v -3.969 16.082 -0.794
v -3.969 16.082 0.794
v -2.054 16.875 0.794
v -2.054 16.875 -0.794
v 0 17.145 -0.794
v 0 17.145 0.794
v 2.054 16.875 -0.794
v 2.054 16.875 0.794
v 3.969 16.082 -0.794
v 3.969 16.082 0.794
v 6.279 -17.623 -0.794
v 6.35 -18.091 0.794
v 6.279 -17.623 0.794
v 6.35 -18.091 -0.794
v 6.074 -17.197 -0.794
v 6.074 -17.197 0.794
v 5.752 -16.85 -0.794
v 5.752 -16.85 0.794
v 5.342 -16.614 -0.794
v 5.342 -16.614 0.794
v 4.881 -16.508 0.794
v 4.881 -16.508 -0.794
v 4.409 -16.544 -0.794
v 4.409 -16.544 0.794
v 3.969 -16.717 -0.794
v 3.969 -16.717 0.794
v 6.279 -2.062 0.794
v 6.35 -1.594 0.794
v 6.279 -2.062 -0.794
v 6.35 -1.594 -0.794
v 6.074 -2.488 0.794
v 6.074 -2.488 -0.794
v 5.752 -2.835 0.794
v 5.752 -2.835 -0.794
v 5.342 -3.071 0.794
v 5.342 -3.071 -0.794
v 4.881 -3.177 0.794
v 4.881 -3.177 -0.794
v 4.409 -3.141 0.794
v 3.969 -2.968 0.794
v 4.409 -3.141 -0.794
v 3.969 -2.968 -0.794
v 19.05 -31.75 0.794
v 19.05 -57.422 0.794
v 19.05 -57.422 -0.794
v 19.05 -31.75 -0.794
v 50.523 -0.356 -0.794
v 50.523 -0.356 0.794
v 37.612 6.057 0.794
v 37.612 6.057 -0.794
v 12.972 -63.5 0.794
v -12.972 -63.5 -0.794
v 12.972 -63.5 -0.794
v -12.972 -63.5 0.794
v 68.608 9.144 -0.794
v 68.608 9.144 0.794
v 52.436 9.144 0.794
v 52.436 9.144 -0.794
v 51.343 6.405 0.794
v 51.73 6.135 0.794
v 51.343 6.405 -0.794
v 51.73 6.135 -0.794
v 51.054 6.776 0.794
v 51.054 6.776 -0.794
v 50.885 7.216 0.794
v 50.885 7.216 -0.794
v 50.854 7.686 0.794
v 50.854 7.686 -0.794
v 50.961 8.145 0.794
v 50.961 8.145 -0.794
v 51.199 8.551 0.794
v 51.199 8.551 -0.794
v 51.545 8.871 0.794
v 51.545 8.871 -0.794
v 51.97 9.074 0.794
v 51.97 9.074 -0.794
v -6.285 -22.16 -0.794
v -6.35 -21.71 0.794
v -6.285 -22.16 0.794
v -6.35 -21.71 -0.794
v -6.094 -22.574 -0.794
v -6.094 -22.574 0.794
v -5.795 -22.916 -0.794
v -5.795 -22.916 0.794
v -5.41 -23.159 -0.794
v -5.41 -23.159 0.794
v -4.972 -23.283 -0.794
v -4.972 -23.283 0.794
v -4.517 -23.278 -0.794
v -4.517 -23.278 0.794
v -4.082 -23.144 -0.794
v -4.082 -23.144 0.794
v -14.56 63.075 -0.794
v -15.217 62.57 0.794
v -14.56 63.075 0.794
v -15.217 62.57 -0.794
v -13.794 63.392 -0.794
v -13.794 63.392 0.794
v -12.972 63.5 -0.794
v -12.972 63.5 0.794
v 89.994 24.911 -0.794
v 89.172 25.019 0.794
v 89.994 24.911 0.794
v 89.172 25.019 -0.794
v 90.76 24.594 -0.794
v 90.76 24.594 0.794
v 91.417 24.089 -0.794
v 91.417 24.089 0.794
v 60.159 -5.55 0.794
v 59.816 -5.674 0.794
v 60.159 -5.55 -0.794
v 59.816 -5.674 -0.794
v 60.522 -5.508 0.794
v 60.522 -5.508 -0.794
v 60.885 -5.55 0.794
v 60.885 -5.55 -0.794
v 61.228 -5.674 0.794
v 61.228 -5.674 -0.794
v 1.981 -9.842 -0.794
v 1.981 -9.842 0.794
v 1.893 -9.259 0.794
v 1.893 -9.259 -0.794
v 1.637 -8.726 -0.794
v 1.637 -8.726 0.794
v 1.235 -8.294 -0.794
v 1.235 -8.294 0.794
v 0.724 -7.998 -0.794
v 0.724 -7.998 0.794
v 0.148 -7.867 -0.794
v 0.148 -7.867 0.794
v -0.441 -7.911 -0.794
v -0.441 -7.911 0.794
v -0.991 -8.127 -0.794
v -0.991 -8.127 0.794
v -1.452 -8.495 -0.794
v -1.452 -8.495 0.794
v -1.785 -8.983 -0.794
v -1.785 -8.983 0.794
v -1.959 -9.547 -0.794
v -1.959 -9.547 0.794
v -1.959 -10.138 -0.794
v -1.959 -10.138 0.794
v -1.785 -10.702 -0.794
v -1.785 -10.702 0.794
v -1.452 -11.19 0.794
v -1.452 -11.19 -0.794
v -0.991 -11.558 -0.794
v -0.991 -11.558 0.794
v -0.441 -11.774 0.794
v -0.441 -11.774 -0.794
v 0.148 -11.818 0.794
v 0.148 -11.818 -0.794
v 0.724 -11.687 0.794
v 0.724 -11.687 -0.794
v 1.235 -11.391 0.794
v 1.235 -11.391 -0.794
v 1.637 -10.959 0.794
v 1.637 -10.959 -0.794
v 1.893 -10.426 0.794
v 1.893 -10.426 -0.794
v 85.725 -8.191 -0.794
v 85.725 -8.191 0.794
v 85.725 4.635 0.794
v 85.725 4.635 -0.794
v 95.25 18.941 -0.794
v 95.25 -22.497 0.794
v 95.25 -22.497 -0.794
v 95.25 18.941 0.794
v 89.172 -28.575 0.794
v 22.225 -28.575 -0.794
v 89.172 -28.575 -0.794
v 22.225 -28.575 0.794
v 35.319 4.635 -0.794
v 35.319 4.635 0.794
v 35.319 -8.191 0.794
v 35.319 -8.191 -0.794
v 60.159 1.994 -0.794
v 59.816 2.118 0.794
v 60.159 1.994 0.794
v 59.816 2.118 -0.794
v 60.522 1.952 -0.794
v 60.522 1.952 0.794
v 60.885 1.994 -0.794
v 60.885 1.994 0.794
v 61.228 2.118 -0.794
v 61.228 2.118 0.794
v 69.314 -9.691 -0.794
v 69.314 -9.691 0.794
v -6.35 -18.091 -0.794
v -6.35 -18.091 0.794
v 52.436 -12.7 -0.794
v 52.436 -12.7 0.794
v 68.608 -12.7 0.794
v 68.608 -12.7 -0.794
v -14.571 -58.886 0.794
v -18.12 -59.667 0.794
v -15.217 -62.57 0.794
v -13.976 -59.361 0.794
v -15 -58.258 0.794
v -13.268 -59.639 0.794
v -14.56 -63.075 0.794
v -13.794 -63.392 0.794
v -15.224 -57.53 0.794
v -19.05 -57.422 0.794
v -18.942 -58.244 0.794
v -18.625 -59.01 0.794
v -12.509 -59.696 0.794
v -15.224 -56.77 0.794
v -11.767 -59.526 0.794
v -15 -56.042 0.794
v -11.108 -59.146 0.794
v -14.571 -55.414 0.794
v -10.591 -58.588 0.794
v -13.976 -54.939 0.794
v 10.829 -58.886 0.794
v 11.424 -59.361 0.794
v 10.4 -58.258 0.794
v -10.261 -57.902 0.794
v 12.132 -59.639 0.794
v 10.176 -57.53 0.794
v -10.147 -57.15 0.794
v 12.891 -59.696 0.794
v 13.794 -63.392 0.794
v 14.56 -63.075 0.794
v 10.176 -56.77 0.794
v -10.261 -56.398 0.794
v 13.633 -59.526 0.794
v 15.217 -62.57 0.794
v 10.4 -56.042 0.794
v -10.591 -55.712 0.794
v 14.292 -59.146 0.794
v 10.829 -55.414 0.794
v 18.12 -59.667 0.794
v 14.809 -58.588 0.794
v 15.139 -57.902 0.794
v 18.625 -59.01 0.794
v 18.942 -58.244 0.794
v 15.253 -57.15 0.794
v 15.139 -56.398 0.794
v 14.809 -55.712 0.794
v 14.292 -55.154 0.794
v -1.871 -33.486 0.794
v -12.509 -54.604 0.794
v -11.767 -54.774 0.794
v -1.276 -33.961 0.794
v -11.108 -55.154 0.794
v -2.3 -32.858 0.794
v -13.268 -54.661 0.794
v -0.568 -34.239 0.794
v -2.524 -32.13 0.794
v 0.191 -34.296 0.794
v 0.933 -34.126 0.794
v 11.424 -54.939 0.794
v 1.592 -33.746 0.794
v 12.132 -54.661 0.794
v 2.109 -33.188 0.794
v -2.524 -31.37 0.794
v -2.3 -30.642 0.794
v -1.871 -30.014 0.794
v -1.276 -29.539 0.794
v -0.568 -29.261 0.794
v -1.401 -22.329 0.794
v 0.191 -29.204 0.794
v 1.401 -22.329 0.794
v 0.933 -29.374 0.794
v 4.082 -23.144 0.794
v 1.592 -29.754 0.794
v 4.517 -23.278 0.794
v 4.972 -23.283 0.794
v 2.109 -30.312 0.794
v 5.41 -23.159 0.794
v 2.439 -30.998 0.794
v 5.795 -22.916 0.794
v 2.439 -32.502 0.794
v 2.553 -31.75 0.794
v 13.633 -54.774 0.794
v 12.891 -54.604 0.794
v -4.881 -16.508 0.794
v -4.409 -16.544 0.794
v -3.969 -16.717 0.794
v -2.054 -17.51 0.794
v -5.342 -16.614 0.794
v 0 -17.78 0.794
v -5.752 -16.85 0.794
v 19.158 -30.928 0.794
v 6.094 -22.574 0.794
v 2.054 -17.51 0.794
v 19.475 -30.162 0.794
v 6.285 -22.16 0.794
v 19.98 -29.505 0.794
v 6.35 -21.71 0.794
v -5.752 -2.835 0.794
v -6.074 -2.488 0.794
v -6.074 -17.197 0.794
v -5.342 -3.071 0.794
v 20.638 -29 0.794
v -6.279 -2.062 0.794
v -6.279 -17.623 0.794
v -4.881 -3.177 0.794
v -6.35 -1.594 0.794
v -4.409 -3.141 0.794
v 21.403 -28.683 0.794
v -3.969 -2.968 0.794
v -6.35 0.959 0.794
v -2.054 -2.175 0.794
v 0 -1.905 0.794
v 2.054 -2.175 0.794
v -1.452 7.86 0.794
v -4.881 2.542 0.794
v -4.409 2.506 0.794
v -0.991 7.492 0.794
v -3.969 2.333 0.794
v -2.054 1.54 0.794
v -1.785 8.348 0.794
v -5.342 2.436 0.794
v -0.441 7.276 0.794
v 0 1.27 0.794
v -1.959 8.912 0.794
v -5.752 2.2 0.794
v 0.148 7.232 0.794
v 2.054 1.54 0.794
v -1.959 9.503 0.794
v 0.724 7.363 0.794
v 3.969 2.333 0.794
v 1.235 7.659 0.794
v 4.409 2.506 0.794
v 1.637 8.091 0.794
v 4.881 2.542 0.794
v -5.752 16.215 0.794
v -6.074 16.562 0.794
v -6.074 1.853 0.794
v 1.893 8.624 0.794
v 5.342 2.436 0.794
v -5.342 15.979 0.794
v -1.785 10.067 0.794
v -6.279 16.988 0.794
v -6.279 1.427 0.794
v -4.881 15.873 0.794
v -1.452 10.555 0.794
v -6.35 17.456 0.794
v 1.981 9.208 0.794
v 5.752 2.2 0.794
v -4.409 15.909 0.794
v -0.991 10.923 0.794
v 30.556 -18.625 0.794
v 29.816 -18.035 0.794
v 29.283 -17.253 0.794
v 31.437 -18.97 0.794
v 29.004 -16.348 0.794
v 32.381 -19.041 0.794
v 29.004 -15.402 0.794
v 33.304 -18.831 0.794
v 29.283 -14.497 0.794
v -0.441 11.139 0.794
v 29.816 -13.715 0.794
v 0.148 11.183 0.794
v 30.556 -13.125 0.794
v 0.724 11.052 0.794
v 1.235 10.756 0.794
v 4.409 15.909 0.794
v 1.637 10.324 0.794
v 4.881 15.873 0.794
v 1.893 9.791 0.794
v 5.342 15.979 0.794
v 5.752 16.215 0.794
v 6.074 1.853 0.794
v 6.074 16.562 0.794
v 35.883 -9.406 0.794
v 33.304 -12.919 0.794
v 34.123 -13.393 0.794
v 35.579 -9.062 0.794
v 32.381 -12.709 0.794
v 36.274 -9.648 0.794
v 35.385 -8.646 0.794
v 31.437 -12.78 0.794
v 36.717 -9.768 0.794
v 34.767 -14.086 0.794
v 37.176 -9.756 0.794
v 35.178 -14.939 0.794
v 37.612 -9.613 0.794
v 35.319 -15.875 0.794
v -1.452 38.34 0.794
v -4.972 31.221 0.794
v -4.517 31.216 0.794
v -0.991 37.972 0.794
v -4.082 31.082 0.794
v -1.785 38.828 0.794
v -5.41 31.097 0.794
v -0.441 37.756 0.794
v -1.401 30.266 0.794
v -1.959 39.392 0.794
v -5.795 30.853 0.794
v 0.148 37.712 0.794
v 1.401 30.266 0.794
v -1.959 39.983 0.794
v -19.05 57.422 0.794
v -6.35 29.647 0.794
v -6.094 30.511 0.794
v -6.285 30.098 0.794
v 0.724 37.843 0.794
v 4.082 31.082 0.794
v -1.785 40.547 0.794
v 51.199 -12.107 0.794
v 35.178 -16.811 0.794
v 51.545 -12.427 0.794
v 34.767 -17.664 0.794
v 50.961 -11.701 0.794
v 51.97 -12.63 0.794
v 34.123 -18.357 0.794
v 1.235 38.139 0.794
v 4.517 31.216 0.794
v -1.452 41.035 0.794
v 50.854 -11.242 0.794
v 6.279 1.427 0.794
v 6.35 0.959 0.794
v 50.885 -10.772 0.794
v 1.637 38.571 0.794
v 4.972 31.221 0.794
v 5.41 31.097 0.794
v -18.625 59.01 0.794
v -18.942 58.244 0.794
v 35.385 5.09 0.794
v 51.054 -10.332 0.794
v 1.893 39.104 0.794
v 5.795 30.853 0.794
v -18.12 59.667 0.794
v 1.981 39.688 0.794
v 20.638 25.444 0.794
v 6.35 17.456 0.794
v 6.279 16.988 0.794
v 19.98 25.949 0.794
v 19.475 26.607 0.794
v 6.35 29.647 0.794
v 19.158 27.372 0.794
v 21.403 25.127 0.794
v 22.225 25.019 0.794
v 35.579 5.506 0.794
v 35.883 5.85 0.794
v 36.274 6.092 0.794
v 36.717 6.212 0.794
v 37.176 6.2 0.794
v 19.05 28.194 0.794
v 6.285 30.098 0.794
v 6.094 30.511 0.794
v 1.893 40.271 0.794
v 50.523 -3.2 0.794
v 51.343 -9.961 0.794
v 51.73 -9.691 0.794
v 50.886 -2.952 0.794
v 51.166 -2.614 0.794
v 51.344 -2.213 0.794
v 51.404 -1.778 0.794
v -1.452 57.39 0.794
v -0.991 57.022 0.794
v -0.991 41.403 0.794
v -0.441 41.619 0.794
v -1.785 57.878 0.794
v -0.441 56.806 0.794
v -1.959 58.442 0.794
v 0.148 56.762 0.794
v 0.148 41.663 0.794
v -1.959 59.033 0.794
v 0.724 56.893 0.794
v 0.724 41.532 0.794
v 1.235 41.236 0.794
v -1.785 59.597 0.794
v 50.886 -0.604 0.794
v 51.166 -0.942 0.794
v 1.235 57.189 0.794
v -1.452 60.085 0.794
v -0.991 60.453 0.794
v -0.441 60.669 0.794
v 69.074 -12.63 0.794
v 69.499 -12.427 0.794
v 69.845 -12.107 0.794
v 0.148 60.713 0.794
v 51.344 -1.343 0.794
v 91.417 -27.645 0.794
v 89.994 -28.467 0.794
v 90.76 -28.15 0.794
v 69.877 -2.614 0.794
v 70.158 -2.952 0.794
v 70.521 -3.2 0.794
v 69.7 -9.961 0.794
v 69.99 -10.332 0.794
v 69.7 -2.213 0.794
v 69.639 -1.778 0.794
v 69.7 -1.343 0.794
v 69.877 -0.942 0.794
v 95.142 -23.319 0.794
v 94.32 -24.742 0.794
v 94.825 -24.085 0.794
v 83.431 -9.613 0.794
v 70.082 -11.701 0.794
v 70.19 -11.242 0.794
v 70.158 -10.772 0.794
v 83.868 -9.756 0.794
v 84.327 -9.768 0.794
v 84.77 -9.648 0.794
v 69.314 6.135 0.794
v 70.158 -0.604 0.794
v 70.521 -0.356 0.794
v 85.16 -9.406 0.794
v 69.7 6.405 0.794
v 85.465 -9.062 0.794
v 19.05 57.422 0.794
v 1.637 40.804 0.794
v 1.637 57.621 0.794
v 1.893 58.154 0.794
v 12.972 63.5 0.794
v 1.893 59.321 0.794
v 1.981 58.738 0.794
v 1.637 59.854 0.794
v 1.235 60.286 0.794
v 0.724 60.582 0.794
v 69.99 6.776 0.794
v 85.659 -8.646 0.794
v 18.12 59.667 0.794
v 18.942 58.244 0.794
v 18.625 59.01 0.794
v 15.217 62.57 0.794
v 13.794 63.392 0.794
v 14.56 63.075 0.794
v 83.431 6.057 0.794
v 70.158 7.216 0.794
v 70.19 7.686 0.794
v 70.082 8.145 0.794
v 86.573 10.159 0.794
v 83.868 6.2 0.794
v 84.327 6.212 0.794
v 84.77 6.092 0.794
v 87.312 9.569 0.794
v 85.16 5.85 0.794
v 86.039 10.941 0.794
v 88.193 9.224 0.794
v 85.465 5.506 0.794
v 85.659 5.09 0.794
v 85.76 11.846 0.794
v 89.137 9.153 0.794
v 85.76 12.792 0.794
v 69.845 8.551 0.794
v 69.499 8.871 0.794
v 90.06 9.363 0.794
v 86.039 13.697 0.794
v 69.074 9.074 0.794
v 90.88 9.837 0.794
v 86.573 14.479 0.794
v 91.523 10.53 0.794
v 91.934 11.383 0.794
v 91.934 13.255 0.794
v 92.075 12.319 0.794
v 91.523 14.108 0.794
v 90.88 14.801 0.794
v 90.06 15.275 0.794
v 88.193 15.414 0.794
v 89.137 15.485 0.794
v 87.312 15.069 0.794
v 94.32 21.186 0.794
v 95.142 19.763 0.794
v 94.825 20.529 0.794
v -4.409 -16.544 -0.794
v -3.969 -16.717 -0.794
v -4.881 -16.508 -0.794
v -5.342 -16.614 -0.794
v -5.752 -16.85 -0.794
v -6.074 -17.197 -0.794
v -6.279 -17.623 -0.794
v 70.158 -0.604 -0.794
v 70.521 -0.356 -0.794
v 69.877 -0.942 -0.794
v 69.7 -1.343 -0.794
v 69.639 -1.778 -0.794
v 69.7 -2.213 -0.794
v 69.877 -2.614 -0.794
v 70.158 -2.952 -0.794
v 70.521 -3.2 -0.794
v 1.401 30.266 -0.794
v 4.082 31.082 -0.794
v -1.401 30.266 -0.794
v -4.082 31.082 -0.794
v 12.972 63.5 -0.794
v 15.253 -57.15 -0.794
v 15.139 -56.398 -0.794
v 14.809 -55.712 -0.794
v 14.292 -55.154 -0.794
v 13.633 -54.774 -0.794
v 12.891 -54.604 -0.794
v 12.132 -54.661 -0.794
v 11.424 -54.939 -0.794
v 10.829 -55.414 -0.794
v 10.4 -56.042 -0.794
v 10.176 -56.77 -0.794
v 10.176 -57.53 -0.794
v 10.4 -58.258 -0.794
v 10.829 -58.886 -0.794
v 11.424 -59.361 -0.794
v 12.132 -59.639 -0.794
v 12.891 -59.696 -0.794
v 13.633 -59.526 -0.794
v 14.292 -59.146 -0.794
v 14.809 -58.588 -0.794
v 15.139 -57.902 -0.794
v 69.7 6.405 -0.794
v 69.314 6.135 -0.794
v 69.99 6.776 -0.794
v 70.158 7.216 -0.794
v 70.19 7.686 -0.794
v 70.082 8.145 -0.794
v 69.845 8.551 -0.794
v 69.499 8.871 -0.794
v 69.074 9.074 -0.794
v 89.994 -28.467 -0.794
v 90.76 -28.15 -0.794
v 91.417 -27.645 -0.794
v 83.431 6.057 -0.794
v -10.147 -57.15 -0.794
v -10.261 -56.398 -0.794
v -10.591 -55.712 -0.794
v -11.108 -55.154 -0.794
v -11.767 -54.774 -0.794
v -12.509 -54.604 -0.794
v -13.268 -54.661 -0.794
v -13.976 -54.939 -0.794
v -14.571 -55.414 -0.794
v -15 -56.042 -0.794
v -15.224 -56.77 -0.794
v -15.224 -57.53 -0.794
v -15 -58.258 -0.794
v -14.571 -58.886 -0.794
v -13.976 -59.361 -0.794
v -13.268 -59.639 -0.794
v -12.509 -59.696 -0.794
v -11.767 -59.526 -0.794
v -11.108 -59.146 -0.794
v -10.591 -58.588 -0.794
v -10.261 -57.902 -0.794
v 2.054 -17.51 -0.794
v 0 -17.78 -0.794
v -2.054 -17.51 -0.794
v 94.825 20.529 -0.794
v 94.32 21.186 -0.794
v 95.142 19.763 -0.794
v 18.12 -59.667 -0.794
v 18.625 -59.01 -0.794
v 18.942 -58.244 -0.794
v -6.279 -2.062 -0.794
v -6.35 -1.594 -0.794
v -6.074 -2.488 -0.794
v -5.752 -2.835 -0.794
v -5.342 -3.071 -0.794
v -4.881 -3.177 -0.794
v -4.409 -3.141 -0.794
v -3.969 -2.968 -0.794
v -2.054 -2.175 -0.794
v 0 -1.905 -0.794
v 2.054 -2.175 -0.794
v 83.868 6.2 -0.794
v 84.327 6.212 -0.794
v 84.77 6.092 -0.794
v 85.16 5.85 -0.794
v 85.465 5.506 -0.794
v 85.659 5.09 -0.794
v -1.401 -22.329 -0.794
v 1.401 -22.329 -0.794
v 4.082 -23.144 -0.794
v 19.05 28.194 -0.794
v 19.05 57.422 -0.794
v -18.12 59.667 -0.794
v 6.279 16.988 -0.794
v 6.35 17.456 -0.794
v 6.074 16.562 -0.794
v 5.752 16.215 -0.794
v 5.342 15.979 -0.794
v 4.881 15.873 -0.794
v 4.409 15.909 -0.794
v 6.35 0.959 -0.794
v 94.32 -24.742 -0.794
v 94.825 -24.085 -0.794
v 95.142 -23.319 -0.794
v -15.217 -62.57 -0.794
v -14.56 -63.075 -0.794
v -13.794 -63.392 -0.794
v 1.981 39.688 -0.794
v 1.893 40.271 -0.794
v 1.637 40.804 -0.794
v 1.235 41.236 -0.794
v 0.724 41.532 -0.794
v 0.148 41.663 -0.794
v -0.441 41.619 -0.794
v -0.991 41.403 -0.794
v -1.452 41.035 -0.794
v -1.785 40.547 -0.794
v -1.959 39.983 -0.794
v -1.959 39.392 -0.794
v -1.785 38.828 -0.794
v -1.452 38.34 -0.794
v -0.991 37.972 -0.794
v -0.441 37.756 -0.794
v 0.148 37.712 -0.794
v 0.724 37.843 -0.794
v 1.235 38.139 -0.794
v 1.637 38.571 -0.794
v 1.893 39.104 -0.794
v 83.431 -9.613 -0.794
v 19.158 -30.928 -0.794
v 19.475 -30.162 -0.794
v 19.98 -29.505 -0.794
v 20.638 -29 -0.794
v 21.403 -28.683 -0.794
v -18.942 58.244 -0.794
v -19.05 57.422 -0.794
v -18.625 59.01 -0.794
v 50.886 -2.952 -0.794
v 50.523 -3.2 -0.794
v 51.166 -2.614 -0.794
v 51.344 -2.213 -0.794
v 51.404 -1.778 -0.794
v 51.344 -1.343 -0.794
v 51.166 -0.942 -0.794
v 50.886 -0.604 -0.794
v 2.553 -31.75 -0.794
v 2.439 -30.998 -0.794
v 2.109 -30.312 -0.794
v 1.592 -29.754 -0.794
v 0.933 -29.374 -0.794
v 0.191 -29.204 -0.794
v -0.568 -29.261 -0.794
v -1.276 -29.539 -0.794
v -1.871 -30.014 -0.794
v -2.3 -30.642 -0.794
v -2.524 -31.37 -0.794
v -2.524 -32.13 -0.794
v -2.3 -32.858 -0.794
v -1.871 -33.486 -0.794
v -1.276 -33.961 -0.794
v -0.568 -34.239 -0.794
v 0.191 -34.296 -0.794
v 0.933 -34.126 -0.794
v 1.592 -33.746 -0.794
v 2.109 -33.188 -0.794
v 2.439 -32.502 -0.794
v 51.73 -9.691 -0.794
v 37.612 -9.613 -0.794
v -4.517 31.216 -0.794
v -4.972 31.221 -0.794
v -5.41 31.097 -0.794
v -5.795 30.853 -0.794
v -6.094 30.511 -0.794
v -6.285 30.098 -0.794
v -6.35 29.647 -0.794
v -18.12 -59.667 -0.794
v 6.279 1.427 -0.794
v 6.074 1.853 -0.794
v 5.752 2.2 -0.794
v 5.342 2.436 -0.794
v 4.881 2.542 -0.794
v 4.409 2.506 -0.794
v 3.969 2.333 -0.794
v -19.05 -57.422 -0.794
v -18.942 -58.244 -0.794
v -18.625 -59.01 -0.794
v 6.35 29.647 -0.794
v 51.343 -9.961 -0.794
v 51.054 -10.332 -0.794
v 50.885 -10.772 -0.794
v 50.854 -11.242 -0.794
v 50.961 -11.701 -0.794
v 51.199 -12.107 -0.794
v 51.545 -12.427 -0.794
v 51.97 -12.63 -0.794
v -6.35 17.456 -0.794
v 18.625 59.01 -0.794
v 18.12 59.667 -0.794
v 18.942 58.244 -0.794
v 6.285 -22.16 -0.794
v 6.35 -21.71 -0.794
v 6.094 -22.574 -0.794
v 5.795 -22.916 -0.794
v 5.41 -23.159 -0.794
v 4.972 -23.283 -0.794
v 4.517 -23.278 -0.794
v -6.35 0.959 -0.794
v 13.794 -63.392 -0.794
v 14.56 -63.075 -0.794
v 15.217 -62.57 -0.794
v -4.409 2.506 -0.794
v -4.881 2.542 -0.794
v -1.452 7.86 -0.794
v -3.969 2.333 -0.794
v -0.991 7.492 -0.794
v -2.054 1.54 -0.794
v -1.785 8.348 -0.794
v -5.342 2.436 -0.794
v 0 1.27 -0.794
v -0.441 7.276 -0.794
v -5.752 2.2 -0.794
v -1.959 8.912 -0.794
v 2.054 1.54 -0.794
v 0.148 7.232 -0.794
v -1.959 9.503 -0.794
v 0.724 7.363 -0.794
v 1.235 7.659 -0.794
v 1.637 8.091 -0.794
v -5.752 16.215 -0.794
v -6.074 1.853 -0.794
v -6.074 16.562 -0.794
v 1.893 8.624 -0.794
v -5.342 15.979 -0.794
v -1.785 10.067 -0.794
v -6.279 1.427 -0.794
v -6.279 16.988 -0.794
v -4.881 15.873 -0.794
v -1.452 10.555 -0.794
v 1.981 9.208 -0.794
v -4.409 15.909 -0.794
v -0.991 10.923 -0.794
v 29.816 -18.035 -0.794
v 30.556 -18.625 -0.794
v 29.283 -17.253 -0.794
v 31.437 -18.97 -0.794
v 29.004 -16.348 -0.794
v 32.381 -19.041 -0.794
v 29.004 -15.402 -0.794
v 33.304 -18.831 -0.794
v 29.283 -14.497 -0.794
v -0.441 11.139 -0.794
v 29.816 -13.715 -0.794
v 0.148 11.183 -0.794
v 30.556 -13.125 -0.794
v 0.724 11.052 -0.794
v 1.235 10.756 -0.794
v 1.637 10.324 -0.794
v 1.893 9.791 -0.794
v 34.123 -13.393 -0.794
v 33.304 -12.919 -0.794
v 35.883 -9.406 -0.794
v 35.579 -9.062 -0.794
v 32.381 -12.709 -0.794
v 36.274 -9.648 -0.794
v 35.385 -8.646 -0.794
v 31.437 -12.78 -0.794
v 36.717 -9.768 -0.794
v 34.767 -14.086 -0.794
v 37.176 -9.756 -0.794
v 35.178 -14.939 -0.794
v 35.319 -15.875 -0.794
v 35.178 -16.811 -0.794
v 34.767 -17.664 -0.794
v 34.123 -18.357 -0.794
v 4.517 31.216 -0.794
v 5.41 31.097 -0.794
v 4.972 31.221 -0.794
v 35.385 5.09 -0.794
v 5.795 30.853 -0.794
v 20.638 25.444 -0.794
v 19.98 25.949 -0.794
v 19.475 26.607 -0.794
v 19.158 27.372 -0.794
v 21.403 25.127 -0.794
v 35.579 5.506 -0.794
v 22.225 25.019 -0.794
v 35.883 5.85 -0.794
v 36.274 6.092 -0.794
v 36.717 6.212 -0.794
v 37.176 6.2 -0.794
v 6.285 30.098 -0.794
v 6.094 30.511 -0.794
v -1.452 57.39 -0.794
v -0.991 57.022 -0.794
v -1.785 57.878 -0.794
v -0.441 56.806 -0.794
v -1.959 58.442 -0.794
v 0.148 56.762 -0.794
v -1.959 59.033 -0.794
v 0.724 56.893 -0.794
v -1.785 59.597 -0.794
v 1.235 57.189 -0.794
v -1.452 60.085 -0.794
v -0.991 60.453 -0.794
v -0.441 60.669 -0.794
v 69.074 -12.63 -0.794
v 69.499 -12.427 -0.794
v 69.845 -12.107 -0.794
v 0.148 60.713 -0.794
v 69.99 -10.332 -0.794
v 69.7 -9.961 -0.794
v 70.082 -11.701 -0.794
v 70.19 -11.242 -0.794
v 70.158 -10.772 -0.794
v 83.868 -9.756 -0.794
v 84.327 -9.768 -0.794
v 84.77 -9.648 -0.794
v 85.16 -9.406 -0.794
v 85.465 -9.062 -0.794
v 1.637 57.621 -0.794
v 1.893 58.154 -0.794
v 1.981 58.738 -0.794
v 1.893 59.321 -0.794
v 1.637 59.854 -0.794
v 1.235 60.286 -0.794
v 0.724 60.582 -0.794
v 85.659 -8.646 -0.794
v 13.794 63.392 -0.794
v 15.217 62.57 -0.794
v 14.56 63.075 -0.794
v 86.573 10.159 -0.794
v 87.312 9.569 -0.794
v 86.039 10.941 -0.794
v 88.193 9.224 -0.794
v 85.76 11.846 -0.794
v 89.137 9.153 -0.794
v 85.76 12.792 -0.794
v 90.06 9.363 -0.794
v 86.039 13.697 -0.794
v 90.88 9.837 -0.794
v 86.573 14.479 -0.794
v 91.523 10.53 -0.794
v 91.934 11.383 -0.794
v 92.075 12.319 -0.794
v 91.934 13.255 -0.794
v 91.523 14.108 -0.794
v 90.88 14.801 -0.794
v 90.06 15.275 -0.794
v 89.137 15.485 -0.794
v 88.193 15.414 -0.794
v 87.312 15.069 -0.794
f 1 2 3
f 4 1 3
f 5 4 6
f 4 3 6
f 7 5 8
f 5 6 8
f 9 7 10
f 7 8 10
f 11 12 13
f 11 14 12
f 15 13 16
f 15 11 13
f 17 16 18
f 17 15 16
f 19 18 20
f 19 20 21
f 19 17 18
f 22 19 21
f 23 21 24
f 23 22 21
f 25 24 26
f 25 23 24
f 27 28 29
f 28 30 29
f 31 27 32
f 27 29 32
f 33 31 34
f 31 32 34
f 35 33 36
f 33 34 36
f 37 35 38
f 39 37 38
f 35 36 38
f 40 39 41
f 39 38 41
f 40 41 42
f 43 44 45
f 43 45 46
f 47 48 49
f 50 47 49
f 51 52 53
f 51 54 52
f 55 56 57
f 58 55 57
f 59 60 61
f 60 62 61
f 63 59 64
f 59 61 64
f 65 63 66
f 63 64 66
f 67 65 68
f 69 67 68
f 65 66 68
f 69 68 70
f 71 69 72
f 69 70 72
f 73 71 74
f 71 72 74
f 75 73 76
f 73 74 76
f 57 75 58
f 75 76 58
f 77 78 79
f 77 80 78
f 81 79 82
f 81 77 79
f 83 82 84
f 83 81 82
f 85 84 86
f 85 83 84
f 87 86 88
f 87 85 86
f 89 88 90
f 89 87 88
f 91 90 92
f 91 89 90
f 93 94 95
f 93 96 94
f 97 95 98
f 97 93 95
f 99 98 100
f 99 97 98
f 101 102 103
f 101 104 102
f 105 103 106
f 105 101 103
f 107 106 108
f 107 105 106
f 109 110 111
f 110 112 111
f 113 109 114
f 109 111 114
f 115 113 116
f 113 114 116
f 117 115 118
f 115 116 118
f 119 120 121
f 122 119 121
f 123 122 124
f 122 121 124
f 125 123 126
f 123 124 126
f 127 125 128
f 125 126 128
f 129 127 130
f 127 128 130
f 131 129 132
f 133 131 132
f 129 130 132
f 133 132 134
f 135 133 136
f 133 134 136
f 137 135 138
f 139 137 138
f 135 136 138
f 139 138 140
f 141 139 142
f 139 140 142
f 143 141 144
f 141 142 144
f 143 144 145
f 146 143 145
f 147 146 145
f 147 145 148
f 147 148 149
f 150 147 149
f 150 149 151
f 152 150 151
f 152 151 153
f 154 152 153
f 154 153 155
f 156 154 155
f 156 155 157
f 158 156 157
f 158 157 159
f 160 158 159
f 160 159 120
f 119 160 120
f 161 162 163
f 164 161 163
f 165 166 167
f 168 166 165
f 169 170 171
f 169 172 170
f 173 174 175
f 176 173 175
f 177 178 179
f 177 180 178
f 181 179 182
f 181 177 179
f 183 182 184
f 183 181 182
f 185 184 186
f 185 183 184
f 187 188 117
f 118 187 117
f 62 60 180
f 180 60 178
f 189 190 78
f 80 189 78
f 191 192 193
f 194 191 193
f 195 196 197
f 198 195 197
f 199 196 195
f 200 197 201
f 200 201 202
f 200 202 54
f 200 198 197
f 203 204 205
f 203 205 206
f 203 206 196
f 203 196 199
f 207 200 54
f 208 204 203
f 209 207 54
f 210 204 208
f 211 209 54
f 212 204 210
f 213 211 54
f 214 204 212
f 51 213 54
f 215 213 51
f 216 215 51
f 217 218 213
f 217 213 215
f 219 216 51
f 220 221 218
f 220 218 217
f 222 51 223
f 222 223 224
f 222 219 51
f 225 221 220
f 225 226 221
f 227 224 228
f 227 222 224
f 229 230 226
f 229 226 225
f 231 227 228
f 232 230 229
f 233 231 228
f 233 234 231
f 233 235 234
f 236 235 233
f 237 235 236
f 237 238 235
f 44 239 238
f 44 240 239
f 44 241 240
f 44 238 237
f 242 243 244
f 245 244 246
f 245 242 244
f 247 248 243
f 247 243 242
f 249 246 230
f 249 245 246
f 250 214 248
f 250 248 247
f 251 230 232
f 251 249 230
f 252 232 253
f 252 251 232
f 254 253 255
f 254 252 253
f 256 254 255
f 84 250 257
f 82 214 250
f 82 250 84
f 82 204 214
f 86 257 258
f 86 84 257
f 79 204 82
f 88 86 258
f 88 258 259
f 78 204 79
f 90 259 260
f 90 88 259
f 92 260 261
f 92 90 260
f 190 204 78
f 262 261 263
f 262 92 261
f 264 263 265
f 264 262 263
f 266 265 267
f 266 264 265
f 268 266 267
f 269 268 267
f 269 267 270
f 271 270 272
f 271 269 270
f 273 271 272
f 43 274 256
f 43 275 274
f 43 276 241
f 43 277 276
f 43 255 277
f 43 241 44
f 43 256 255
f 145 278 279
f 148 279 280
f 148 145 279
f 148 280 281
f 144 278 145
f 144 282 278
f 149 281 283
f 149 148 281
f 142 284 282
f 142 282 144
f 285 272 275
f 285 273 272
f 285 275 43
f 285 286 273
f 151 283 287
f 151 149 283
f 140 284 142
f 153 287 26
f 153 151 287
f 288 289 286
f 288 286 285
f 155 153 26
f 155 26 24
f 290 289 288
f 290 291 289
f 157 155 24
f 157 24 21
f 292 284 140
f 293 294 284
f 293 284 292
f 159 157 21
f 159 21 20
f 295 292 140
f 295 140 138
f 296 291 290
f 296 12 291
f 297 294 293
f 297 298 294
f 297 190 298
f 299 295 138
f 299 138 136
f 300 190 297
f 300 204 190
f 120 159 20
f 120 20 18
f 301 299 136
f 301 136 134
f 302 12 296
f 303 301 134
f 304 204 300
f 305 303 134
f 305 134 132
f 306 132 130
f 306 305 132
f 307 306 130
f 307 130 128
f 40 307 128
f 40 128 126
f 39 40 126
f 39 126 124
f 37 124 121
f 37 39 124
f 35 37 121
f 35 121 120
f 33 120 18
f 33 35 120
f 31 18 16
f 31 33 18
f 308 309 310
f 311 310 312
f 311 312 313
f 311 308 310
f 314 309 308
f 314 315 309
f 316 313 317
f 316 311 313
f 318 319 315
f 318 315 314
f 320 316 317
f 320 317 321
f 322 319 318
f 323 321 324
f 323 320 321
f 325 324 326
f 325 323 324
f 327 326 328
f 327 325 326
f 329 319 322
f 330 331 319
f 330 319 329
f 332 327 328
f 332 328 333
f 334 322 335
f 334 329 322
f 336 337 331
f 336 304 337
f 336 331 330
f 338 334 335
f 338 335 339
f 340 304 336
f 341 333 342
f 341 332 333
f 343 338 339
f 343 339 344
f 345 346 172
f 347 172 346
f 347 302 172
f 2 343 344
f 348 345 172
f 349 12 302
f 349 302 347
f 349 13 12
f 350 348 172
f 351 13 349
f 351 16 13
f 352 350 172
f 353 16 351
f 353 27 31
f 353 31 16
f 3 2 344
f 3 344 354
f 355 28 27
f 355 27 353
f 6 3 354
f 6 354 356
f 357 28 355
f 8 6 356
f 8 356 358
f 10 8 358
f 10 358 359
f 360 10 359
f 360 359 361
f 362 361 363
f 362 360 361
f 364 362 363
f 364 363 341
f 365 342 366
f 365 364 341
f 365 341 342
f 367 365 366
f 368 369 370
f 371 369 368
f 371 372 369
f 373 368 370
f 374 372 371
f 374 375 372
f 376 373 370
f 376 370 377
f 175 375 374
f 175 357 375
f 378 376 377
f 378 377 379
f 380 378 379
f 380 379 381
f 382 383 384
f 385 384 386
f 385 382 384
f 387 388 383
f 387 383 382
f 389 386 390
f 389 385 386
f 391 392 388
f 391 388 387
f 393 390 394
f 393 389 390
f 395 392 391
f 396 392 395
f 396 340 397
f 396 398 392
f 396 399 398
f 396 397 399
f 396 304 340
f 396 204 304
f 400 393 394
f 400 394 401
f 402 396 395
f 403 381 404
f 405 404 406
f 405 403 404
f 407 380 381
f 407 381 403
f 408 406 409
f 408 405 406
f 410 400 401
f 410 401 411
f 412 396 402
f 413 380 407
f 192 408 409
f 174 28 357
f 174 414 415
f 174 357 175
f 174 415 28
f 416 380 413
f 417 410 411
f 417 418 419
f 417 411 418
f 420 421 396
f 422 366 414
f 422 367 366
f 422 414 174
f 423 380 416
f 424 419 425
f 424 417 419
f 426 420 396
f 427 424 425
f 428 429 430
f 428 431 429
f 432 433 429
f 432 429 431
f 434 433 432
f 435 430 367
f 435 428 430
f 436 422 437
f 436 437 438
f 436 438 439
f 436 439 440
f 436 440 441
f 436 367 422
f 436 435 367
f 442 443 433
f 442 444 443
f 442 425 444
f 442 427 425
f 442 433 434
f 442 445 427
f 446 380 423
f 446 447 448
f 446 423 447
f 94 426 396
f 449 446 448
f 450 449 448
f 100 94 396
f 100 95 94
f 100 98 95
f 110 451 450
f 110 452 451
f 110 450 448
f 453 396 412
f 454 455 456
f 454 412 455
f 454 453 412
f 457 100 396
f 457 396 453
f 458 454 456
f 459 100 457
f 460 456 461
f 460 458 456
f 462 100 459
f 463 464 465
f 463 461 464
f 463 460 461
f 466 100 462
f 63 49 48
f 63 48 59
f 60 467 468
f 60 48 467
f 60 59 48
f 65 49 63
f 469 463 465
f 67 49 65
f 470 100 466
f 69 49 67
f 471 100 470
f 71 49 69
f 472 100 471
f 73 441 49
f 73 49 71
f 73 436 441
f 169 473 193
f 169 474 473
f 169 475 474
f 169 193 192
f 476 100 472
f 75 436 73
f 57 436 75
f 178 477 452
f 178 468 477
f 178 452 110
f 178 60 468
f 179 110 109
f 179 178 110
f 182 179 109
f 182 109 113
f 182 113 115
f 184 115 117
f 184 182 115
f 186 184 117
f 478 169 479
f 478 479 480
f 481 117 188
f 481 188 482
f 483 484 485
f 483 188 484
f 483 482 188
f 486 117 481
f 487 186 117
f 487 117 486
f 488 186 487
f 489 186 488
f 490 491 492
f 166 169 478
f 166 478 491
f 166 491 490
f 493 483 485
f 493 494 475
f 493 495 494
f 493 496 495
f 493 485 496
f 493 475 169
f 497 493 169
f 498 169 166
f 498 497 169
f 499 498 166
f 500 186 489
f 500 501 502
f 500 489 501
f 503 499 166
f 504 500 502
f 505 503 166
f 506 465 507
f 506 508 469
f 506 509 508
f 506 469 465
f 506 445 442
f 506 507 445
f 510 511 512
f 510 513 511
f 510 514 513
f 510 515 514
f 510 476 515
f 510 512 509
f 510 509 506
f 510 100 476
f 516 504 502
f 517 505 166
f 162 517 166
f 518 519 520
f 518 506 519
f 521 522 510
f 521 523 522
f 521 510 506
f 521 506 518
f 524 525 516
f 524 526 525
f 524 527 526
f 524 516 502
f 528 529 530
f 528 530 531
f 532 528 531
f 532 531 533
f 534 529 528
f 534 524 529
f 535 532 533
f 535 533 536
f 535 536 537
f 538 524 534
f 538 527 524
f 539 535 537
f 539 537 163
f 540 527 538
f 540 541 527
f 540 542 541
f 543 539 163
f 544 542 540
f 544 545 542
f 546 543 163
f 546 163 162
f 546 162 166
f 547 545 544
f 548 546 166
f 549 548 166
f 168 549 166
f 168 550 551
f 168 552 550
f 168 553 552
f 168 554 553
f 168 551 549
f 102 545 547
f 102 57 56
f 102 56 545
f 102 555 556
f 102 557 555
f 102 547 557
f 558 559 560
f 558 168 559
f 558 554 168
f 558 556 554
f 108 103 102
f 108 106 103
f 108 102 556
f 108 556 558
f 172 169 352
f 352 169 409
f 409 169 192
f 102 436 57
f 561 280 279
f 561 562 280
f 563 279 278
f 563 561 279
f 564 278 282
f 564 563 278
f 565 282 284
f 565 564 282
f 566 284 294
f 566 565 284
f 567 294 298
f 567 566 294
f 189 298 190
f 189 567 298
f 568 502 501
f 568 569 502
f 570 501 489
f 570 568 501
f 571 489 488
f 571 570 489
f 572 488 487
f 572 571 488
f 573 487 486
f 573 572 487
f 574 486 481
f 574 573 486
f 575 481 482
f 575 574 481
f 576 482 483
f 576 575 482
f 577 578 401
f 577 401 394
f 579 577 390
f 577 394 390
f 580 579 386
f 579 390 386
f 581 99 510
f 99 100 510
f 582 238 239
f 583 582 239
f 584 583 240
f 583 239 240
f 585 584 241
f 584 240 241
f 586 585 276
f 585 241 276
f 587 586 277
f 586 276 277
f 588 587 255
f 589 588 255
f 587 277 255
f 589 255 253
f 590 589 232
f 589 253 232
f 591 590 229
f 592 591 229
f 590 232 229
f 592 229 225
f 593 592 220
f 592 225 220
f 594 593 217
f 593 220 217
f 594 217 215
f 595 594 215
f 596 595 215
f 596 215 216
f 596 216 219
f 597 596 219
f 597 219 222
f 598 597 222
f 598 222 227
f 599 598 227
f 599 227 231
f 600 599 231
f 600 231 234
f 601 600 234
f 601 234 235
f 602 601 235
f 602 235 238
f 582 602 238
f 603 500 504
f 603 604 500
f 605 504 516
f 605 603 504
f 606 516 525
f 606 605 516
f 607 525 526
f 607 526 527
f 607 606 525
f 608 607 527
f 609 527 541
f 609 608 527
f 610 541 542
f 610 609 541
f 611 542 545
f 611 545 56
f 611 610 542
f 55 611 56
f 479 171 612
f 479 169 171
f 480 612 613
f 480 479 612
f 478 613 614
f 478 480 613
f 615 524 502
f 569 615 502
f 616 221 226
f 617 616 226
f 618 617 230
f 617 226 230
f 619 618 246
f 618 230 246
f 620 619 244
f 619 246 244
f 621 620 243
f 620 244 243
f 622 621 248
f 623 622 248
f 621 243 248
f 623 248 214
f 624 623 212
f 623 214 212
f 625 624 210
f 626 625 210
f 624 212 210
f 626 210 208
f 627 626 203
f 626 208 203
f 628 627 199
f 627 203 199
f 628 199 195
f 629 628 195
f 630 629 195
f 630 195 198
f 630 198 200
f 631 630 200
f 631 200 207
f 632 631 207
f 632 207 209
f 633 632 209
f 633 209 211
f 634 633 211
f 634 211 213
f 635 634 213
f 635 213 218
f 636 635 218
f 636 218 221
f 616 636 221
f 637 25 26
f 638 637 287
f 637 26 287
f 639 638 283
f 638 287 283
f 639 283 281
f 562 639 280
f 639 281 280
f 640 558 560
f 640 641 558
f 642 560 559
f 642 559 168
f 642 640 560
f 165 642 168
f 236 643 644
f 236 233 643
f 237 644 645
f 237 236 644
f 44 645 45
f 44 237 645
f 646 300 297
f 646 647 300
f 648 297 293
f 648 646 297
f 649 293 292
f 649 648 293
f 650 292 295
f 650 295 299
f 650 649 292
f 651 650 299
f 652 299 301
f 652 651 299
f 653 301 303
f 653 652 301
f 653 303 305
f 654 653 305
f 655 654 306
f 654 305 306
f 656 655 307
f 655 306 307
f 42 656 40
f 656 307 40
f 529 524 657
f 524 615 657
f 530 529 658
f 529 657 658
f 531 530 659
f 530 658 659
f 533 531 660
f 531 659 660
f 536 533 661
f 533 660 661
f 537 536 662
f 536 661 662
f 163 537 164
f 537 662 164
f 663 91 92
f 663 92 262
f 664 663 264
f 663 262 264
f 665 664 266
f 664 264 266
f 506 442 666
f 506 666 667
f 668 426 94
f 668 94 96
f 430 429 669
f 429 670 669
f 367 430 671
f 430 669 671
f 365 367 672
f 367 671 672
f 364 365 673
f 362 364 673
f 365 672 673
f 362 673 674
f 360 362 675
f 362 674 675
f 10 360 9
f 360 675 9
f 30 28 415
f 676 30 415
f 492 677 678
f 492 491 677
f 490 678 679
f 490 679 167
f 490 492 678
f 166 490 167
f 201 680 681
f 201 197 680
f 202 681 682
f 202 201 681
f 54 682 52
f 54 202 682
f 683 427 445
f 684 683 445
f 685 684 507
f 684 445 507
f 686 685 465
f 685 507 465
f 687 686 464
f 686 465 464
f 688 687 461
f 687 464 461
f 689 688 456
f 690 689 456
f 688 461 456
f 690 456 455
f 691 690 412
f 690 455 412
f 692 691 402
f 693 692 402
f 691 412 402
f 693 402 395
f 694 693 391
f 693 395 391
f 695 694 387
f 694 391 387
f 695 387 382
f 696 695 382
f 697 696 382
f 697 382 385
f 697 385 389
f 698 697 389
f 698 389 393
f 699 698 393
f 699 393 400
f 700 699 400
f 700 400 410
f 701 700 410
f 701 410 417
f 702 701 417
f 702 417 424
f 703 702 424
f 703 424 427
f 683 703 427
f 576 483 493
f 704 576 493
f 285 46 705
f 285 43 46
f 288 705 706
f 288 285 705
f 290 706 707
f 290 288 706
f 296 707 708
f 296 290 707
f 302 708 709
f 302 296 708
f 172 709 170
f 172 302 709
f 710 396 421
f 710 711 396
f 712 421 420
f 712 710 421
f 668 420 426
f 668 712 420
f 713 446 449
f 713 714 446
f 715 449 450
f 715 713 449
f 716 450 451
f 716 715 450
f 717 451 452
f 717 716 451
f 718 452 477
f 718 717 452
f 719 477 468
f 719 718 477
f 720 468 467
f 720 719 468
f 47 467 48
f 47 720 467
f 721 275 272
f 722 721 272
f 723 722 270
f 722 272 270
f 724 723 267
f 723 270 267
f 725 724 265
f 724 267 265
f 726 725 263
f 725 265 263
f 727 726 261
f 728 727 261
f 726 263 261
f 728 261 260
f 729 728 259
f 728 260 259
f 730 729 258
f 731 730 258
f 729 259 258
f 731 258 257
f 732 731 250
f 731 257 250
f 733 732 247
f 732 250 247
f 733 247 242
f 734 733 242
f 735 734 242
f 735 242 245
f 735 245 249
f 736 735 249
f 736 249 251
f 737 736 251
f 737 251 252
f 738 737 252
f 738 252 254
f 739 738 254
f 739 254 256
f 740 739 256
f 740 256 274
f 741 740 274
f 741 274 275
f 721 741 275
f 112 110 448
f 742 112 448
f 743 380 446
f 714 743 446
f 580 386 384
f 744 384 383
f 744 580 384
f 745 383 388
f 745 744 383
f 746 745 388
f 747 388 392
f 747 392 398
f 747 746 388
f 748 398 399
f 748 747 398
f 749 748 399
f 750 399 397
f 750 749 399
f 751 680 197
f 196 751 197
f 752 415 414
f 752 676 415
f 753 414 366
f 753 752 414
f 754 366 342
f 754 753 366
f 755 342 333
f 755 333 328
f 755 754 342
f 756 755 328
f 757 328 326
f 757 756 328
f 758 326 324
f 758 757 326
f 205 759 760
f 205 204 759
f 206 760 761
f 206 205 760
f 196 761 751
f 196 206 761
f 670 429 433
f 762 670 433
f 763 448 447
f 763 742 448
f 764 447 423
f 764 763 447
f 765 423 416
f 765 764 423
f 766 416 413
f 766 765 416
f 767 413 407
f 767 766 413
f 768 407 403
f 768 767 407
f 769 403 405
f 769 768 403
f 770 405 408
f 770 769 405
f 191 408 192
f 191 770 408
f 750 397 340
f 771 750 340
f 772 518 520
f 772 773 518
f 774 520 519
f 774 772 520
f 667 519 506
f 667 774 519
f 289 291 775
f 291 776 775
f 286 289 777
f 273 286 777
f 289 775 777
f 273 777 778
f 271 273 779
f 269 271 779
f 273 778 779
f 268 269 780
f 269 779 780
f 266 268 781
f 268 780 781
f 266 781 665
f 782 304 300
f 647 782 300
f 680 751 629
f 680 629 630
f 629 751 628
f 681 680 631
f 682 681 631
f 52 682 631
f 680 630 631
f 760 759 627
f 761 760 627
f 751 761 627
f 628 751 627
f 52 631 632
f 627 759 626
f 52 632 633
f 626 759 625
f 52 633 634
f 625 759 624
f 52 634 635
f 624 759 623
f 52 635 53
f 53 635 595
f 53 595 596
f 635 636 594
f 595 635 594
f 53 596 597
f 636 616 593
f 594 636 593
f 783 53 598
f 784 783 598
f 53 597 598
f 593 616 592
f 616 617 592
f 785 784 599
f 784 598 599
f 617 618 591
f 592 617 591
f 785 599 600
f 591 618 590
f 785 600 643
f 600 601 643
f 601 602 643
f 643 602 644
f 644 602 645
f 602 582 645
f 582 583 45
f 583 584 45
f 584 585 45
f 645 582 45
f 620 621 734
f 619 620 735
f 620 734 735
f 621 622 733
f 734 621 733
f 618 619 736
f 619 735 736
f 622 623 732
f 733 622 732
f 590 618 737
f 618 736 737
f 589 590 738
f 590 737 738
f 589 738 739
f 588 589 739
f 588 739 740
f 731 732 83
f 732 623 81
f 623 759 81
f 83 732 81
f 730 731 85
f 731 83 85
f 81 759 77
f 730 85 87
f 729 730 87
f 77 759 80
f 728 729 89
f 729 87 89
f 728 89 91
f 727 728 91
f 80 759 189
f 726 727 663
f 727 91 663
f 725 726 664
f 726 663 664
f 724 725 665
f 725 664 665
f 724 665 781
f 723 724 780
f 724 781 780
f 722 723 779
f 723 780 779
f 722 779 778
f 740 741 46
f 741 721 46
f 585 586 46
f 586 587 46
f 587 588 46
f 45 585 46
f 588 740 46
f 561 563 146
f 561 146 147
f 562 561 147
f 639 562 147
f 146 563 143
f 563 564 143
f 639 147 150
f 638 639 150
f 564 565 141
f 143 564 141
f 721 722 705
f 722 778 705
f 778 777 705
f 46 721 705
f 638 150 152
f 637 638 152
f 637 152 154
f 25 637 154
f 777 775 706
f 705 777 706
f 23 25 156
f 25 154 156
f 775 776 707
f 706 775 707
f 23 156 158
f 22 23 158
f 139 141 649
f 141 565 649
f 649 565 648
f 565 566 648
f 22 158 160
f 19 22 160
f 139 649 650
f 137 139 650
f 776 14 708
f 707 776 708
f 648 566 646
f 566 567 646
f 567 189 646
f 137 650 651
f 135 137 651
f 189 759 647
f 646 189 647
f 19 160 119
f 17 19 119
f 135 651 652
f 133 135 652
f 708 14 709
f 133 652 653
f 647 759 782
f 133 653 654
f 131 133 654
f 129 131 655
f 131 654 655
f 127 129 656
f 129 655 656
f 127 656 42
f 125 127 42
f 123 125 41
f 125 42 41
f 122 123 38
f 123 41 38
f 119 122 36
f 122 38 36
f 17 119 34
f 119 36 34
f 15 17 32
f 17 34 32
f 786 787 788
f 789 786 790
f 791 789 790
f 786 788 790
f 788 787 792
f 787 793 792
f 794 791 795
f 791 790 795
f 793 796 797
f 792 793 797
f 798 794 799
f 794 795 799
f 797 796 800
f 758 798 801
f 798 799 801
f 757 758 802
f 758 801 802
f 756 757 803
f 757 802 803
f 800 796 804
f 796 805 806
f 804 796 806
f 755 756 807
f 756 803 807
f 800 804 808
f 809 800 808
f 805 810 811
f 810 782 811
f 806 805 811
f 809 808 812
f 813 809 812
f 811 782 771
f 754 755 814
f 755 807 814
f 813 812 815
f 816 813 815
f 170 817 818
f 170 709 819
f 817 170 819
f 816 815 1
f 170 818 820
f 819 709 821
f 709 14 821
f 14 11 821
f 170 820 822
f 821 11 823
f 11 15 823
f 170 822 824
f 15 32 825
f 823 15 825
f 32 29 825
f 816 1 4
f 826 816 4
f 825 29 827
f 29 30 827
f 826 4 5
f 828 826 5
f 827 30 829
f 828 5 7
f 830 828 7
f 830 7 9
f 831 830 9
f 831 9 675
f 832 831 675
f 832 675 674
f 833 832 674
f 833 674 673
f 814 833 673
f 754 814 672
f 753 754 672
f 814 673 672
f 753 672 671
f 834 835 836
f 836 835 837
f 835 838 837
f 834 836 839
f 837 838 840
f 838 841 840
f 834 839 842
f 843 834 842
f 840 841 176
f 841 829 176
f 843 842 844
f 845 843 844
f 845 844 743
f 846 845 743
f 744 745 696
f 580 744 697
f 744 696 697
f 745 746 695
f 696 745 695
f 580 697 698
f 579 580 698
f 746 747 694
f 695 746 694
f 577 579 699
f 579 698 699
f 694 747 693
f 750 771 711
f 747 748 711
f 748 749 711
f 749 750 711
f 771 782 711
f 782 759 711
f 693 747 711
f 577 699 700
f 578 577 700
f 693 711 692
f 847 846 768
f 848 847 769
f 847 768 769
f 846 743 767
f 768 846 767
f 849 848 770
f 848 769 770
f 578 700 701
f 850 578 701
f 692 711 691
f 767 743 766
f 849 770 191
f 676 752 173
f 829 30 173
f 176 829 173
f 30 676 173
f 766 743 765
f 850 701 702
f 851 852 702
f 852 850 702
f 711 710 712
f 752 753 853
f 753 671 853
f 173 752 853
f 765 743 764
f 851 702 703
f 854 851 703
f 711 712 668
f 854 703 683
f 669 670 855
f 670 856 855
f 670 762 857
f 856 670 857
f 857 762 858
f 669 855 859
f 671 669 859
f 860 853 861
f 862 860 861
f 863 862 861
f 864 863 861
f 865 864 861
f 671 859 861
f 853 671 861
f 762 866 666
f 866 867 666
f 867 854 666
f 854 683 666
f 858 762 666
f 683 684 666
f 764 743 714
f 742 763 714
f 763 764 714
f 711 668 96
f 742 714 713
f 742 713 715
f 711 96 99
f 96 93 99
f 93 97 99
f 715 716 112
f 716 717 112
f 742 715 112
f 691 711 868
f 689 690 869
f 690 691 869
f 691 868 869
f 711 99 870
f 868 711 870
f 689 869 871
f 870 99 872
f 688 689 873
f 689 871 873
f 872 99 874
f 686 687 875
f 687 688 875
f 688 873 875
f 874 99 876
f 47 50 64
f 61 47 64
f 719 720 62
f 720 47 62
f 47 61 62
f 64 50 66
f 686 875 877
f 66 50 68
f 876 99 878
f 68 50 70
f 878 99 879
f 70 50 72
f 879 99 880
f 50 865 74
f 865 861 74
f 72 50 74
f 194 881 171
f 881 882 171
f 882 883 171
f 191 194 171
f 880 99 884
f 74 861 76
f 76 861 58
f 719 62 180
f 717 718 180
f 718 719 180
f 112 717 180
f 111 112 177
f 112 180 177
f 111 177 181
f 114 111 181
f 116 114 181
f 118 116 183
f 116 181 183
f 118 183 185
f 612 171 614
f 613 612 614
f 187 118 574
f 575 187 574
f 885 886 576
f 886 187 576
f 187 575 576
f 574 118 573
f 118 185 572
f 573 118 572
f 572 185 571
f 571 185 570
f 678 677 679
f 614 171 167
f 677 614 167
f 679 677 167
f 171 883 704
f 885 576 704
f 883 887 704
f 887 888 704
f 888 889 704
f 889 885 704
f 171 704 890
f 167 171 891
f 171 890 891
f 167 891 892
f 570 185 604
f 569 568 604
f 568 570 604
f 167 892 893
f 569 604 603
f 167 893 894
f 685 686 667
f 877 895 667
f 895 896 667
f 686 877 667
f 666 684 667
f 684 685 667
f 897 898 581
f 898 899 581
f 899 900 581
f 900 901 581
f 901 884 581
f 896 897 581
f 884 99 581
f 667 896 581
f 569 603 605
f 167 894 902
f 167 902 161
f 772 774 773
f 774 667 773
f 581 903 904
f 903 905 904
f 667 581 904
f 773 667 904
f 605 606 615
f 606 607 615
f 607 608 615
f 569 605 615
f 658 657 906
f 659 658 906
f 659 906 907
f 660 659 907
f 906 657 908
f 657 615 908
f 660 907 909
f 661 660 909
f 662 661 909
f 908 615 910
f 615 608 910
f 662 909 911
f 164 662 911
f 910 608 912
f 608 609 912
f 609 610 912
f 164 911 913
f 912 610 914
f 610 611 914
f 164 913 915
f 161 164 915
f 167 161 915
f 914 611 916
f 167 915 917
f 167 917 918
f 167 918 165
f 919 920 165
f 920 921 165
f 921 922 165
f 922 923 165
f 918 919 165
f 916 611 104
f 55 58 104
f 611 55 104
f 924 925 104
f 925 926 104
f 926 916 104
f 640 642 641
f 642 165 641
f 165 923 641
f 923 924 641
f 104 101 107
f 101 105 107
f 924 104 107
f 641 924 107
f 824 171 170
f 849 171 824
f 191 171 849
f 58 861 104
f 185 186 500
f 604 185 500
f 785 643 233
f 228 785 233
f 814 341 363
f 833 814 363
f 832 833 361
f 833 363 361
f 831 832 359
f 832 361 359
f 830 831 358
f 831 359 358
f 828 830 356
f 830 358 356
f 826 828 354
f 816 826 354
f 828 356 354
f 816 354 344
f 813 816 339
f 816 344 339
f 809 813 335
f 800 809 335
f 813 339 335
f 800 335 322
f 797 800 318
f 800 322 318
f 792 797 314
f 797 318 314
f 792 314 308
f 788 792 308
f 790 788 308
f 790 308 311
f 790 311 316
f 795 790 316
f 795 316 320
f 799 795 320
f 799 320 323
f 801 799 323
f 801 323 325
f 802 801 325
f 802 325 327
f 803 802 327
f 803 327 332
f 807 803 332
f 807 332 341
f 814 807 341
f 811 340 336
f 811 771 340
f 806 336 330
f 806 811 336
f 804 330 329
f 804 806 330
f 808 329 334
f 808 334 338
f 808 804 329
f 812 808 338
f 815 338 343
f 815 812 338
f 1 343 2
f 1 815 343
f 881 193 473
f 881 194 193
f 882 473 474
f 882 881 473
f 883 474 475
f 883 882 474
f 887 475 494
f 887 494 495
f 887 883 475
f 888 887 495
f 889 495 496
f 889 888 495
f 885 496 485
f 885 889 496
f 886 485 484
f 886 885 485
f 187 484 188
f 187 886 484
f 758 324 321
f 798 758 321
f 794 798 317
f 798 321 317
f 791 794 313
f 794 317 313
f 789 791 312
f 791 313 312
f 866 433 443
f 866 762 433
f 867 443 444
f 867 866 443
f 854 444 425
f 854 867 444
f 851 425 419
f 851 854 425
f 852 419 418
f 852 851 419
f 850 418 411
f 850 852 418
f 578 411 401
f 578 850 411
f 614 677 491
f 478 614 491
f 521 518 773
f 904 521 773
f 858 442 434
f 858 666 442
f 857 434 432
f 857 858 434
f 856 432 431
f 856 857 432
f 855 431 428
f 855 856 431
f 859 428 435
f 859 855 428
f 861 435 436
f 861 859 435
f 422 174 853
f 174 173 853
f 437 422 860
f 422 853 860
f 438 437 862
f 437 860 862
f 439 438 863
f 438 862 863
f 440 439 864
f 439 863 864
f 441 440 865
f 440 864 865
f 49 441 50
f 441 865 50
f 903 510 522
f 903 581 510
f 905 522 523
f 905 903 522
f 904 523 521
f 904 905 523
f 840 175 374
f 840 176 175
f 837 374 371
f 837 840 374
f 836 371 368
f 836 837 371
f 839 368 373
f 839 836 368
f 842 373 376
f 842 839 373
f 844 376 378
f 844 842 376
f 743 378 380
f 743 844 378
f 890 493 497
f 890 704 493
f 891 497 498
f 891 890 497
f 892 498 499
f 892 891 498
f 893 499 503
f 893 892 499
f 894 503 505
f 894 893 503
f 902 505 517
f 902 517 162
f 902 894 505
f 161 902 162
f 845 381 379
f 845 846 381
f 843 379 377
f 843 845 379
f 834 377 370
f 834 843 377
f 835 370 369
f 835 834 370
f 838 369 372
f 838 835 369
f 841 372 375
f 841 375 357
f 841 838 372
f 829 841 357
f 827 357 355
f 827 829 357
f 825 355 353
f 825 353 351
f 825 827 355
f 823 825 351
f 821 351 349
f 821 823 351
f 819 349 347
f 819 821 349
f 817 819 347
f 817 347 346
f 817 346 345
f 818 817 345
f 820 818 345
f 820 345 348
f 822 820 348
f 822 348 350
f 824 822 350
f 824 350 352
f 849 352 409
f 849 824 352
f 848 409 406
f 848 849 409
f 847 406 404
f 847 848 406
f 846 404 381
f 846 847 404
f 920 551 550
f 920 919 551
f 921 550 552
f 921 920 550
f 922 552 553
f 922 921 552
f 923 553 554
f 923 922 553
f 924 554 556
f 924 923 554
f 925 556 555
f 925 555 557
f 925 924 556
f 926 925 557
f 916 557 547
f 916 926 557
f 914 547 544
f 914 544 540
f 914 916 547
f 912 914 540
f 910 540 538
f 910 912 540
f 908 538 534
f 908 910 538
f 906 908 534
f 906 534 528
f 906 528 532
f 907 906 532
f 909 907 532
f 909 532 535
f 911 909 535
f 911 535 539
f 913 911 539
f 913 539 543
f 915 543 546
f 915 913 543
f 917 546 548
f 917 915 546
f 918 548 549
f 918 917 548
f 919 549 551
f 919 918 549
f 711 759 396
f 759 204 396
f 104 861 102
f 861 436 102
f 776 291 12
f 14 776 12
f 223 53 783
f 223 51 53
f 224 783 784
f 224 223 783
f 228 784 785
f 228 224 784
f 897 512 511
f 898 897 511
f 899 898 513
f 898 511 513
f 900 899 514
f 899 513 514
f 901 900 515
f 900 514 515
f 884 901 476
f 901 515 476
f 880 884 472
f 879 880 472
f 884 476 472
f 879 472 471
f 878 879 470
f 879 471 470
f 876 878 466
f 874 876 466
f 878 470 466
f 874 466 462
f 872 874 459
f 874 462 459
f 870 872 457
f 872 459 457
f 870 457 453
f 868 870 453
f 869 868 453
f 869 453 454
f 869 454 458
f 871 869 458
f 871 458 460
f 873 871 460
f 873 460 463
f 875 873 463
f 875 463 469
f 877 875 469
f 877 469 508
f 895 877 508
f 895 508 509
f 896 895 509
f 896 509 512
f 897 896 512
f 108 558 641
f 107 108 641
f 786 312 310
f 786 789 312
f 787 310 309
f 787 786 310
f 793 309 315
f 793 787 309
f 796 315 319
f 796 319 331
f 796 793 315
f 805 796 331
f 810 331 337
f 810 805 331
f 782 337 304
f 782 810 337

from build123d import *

# Parameters (mm, degrees)
SKETCH1_W           = 76.2
SKETCH1_H           = 53.594
SKETCH1_R           = 3.175
SKETCH1_W_2         = 38.1
SKETCH1_H_2         = 127
BOSS_EXTRUDE1_DEPTH = 0.79375
SKETCH2_R           = 2.5527
SKETCH2_R_2         = 1.9812
CUT_EXTRUDE1_DEPTH  = 115.487259799
CUT_EXTRUDE2_DEPTH  = 115.487259799
FILLET2_R           = 1.5875
CHAMFER1_SIZE       = 4.7625
FILLET3_R           = 3.175
CUT_EXTRUDE3_DEPTH  = 115.487259799
FILLET5_R           = 1.5875


with BuildPart() as part:
    # Sketch1 → Boss-Extrude1 (new, symmetric)
    # profile 1 of 2: a face of its own
    with BuildSketch(Plane.XY):
        with Locations((57.15, -1.778)):
            Rectangle(SKETCH1_W, SKETCH1_H)
        with Locations((32.1437, -15.875)):
            Circle(SKETCH1_R, mode=Mode.SUBTRACT)
        with Locations((88.9, 12.319)):
            Circle(SKETCH1_R, mode=Mode.SUBTRACT)
    # profile 2 of 2: a face of its own
    with BuildSketch(Plane.XY):
        Rectangle(SKETCH1_W_2, SKETCH1_H_2)
    extrude(amount=BOSS_EXTRUDE1_DEPTH, both=True)

    # Sketch2 → Cut-Extrude1 (cut, through all)
    with BuildSketch(Plane.XY.offset(0.79375)):
        with Locations((-12.7, -57.15)):
            Circle(SKETCH2_R)
        with Locations((12.7, -57.15)):
            Circle(SKETCH2_R)
        with Locations((0, -31.75)):
            Circle(SKETCH2_R)
        with Locations((0, -9.8425)):
            Circle(SKETCH2_R_2)
        with Locations((0, 9.2075)):
            Circle(SKETCH2_R_2)
        with Locations((0, 39.6875)):
            Circle(SKETCH2_R_2)
        with Locations((0, 58.7375)):
            Circle(SKETCH2_R_2)
    extrude(amount=-CUT_EXTRUDE1_DEPTH, mode=Mode.SUBTRACT)

    # Sketch3 → Cut-Extrude2 (cut, through all)
    with BuildSketch(Plane.XY.offset(0.79375)):
        Polygon((45.671811727, 9.144), (60.52185, 1.767162907), (75.371888273, 9.144), align=None)
        Polygon((35.3187, 7.196638614), (35.3187, -10.752638614), (53.385213498, -1.778), align=None)
        Polygon((60.52185, -5.323162907), (45.671811727, -12.7), (75.371888273, -12.7), align=None)
        Polygon((85.725, 7.196638614), (67.658486502, -1.778), (85.725, -10.752638614), align=None)
    extrude(amount=-CUT_EXTRUDE2_DEPTH, mode=Mode.SUBTRACT)

    # Fillet2
    fillet2_edges = [part.edges().sort_by_distance(p)[0] for p in [
        (60.52185, 1.767162907, 0),
        (45.671811727, 9.144, 0),
        (75.371888273, 9.144, 0),
        (35.3187, -10.752638614, 0),
        (35.3187, 7.196638614, 0),
        (53.385213498, -1.778, 0),
        (45.671811727, -12.7, 0),
        (60.52185, -5.323162907, 0),
        (75.371888273, -12.7, 0),
        (67.658486502, -1.778, 0),
        (85.725, 7.196638614, 0),
        (85.725, -10.752638614, 0),
    ]]
    fillet(fillet2_edges, radius=FILLET2_R)

    # Chamfer1
    chamfer1_edges = [part.edges().sort_by_distance(p)[0] for p in [
        (95.25, -28.575, 0),
        (19.05, -63.5, 0),
        (-19.05, -63.5, 0),
        (-19.05, 63.5, 0),
        (19.05, 63.5, 0),
        (95.25, 25.019, 0),
    ]]
    chamfer(chamfer1_edges, length=CHAMFER1_SIZE)

    # Fillet3
    fillet3_edges = [part.edges().sort_by_distance(p)[0] for p in [
        (19.05, -28.575, 0),
        (90.4875, 25.019, 0),
        (19.05, 25.019, 0),
        (95.25, -23.8125, 0),
        (95.25, 20.2565, 0),
        (90.4875, -28.575, 0),
        (19.05, -58.7375, 0),
        (-14.2875, -63.5, 0),
        (14.2875, -63.5, 0),
        (-19.05, 58.7375, 0),
        (-19.05, -58.7375, 0),
        (-14.2875, 63.5, 0),
        (14.2875, 63.5, 0),
        (19.05, 58.7375, 0),
    ]]
    fillet(fillet3_edges, radius=FILLET3_R)

    # Sketch5 → Cut-Extrude3 (cut, through all)
    with BuildSketch(Plane.XY.offset(0.79375)):
        with BuildLine():
            ThreePointArc((-6.35, -24.650484171), (0, -22.225), (6.35, -24.650484171))
            Line((6.35, -24.650484171), (6.35, -14.605))
            ThreePointArc((6.35, -14.605), (0, -17.78), (-6.35, -14.605))
            Line((-6.35, -14.605), (-6.35, -24.650484171))
        make_face()
        with BuildLine():
            Line((6.35, -5.08), (6.35, 4.445))
            ThreePointArc((6.35, 4.445), (0, 1.27), (-6.35, 4.445))
            Line((-6.35, 4.445), (-6.35, -5.08))
            ThreePointArc((-6.35, -5.08), (0, -1.905), (6.35, -5.08))
        make_face()
        with BuildLine():
            Line((6.35, 13.97), (6.35, 28.194))
            Line((6.35, 28.194), (6.35, 32.587984171))
            ThreePointArc((6.35, 32.587984171), (0, 30.1625), (-6.35, 32.587984171))
            Line((-6.35, 32.587984171), (-6.35, 13.97))
            ThreePointArc((-6.35, 13.97), (0, 17.145), (6.35, 13.97))
        make_face()
    extrude(amount=-CUT_EXTRUDE3_DEPTH, mode=Mode.SUBTRACT)

    # Fillet5
    fillet5_edges = [part.edges().sort_by_distance(p)[0] for p in [
        (6.35, -24.650484171, 0),
        (-6.35, -24.650484171, 0),
        (-6.35, -14.605, 0),
        (6.35, -14.605, 0),
        (6.35, -5.08, 0),
        (-6.35, -5.08, 0),
        (-6.35, 4.445, 0),
        (6.35, 4.445, 0),
        (6.35, 13.97, 0),
        (-6.35, 13.97, 0),
        (-6.35, 32.587984171, 0),
        (6.35, 32.587984171, 0),
    ]]
    fillet(fillet5_edges, radius=FILLET5_R)


solid = part.part
